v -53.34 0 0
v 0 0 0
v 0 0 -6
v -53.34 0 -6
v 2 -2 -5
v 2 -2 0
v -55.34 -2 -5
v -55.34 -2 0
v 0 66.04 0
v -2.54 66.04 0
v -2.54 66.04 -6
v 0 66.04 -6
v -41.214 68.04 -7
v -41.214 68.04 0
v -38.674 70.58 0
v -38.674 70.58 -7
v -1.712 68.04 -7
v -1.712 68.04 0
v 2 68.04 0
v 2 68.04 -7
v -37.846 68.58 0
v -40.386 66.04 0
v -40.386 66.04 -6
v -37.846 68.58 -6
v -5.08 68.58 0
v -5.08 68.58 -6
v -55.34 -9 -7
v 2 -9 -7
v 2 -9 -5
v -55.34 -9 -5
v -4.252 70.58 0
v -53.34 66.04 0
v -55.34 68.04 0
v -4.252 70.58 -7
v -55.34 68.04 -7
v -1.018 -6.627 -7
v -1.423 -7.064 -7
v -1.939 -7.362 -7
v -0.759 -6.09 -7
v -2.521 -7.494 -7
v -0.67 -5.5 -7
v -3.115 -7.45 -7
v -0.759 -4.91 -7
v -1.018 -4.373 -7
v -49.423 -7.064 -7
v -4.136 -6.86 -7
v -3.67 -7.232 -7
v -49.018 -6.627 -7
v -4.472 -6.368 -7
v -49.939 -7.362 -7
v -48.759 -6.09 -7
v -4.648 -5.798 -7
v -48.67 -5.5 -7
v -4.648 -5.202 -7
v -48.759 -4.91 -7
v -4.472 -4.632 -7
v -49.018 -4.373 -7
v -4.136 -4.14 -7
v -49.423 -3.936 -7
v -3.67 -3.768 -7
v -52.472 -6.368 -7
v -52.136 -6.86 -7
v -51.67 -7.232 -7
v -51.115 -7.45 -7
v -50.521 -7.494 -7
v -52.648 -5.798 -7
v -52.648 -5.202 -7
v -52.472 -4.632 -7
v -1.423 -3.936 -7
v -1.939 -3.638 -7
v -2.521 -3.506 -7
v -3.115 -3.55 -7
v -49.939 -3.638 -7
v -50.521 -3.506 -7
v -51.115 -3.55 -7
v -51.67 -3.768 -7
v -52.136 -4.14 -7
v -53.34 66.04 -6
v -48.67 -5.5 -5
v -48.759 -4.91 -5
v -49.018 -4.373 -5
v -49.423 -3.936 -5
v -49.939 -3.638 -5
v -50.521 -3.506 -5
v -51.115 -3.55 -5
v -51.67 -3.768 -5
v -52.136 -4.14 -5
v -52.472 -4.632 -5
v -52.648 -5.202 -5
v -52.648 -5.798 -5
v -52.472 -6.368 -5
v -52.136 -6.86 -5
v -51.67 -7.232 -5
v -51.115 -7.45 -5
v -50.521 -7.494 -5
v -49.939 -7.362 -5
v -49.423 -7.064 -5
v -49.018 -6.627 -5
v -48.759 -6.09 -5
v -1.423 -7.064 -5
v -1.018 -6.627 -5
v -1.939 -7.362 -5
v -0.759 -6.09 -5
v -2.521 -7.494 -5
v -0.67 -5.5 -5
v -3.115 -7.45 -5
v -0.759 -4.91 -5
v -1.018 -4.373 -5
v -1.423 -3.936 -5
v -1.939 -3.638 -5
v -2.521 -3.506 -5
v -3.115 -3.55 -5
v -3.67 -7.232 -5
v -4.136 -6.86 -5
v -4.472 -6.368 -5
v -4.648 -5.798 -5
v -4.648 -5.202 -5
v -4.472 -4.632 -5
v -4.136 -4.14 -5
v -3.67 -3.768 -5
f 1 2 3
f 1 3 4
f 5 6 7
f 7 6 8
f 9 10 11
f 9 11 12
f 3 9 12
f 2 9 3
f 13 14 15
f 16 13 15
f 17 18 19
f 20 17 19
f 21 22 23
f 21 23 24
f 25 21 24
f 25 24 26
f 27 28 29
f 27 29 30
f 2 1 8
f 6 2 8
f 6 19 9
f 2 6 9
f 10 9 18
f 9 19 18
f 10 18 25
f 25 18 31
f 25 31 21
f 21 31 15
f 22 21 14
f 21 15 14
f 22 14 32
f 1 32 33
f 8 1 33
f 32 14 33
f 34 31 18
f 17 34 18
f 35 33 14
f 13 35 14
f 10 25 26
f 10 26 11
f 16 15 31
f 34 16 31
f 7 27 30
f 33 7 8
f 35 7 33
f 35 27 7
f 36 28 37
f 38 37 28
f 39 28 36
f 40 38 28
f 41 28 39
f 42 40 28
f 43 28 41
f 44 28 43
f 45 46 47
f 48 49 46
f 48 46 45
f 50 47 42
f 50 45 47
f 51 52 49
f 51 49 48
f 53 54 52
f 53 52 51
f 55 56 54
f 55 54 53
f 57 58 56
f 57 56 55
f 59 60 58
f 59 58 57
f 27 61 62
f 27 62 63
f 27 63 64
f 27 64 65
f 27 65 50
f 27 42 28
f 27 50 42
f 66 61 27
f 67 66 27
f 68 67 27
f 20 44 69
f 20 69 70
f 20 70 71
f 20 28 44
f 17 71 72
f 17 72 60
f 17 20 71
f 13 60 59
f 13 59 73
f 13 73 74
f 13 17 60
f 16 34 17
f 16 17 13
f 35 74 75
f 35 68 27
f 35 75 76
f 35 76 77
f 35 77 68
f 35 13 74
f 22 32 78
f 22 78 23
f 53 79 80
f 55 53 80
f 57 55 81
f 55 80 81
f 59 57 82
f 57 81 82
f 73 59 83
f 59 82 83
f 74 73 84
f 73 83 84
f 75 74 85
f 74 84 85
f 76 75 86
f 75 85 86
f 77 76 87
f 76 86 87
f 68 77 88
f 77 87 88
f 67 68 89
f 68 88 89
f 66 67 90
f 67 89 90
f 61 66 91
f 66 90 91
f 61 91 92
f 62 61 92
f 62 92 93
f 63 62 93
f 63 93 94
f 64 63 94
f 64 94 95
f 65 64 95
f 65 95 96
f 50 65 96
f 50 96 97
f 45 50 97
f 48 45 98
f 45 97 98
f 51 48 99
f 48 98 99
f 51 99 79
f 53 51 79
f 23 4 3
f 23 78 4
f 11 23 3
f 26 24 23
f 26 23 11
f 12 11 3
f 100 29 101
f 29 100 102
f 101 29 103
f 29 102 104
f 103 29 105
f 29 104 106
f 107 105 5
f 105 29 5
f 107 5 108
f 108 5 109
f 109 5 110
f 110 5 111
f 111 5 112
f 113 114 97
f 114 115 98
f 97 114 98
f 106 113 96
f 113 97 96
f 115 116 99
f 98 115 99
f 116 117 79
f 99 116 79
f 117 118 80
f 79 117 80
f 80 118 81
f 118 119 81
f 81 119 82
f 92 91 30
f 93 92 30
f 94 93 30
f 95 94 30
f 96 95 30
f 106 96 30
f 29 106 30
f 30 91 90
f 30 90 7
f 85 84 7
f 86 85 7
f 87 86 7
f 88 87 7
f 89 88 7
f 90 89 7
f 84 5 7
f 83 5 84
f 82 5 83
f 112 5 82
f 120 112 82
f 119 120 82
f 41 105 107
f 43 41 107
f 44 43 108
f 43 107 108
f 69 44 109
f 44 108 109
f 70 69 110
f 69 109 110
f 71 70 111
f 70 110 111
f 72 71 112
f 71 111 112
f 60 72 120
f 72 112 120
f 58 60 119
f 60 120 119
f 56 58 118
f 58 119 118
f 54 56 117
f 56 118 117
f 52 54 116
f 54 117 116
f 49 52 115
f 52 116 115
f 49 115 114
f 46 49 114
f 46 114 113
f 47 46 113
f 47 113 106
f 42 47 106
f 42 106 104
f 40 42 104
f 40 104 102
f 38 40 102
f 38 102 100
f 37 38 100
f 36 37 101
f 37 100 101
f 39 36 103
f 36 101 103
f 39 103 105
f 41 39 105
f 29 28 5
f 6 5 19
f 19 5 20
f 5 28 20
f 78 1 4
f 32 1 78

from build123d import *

# Parameters (mm, degrees)
BOSS_EXTRUDE1_DEPTH = 7
BOSS_EXTRUDE2_DEPTH = 1
SKETCH3_W           = 57.34
SKETCH3_H           = 7
BOSS_EXTRUDE3_DEPTH = 2
SKETCH4_R           = 2
CUT_EXTRUDE1_DEPTH  = 2


with BuildPart() as part:
    # Sketch1 → Boss-Extrude1 (new body)
    with BuildSketch(Plane.XY):
        Polygon((2, -2), (-55.34, -2), (-55.34, 68.04), (-41.214427125, 68.04), (-38.674427125, 70.58), (-4.251572875, 70.58), (-1.711572875, 68.04), (2, 68.04), align=None)
        Polygon((-53.34, 0), (-53.34, 66.04), (-40.386, 66.04), (-37.846, 68.58), (-5.08, 68.58), (-2.54, 66.04), (0, 66.04), (0, 0), align=None, mode=Mode.SUBTRACT)
    extrude(amount=-BOSS_EXTRUDE1_DEPTH)

    # Sketch2 → Boss-Extrude2 (add)
    with BuildSketch(Plane(origin=(0, 0, -7), x_dir=(-1, 0, 0), z_dir=(0, 0, -1))):
        Polygon((53.34, 0), (0, 0), (0, 66.04), (2.54, 66.04), (5.08, 68.58), (37.846, 68.58), (40.386, 66.04), (53.34, 66.04), align=None)
    extrude(amount=-BOSS_EXTRUDE2_DEPTH)

    # Sketch3 → Boss-Extrude3 (add)
    with BuildSketch(Plane(origin=(0, 0, -7), x_dir=(-1, 0, 0), z_dir=(0, 0, -1))):
        with Locations((26.67, -5.5)):
            Rectangle(SKETCH3_W, SKETCH3_H)
    extrude(amount=-BOSS_EXTRUDE3_DEPTH)

    # Sketch4 → Cut-Extrude1 (cut)
    with BuildSketch(Plane.XY.offset(-5)):
        with Locations((-2.67, -5.5)):
            Circle(SKETCH4_R)
        with Locations((-50.67, -5.5)):
            Circle(SKETCH4_R)
    extrude(amount=-CUT_EXTRUDE1_DEPTH, mode=Mode.SUBTRACT)


solid = part.part
